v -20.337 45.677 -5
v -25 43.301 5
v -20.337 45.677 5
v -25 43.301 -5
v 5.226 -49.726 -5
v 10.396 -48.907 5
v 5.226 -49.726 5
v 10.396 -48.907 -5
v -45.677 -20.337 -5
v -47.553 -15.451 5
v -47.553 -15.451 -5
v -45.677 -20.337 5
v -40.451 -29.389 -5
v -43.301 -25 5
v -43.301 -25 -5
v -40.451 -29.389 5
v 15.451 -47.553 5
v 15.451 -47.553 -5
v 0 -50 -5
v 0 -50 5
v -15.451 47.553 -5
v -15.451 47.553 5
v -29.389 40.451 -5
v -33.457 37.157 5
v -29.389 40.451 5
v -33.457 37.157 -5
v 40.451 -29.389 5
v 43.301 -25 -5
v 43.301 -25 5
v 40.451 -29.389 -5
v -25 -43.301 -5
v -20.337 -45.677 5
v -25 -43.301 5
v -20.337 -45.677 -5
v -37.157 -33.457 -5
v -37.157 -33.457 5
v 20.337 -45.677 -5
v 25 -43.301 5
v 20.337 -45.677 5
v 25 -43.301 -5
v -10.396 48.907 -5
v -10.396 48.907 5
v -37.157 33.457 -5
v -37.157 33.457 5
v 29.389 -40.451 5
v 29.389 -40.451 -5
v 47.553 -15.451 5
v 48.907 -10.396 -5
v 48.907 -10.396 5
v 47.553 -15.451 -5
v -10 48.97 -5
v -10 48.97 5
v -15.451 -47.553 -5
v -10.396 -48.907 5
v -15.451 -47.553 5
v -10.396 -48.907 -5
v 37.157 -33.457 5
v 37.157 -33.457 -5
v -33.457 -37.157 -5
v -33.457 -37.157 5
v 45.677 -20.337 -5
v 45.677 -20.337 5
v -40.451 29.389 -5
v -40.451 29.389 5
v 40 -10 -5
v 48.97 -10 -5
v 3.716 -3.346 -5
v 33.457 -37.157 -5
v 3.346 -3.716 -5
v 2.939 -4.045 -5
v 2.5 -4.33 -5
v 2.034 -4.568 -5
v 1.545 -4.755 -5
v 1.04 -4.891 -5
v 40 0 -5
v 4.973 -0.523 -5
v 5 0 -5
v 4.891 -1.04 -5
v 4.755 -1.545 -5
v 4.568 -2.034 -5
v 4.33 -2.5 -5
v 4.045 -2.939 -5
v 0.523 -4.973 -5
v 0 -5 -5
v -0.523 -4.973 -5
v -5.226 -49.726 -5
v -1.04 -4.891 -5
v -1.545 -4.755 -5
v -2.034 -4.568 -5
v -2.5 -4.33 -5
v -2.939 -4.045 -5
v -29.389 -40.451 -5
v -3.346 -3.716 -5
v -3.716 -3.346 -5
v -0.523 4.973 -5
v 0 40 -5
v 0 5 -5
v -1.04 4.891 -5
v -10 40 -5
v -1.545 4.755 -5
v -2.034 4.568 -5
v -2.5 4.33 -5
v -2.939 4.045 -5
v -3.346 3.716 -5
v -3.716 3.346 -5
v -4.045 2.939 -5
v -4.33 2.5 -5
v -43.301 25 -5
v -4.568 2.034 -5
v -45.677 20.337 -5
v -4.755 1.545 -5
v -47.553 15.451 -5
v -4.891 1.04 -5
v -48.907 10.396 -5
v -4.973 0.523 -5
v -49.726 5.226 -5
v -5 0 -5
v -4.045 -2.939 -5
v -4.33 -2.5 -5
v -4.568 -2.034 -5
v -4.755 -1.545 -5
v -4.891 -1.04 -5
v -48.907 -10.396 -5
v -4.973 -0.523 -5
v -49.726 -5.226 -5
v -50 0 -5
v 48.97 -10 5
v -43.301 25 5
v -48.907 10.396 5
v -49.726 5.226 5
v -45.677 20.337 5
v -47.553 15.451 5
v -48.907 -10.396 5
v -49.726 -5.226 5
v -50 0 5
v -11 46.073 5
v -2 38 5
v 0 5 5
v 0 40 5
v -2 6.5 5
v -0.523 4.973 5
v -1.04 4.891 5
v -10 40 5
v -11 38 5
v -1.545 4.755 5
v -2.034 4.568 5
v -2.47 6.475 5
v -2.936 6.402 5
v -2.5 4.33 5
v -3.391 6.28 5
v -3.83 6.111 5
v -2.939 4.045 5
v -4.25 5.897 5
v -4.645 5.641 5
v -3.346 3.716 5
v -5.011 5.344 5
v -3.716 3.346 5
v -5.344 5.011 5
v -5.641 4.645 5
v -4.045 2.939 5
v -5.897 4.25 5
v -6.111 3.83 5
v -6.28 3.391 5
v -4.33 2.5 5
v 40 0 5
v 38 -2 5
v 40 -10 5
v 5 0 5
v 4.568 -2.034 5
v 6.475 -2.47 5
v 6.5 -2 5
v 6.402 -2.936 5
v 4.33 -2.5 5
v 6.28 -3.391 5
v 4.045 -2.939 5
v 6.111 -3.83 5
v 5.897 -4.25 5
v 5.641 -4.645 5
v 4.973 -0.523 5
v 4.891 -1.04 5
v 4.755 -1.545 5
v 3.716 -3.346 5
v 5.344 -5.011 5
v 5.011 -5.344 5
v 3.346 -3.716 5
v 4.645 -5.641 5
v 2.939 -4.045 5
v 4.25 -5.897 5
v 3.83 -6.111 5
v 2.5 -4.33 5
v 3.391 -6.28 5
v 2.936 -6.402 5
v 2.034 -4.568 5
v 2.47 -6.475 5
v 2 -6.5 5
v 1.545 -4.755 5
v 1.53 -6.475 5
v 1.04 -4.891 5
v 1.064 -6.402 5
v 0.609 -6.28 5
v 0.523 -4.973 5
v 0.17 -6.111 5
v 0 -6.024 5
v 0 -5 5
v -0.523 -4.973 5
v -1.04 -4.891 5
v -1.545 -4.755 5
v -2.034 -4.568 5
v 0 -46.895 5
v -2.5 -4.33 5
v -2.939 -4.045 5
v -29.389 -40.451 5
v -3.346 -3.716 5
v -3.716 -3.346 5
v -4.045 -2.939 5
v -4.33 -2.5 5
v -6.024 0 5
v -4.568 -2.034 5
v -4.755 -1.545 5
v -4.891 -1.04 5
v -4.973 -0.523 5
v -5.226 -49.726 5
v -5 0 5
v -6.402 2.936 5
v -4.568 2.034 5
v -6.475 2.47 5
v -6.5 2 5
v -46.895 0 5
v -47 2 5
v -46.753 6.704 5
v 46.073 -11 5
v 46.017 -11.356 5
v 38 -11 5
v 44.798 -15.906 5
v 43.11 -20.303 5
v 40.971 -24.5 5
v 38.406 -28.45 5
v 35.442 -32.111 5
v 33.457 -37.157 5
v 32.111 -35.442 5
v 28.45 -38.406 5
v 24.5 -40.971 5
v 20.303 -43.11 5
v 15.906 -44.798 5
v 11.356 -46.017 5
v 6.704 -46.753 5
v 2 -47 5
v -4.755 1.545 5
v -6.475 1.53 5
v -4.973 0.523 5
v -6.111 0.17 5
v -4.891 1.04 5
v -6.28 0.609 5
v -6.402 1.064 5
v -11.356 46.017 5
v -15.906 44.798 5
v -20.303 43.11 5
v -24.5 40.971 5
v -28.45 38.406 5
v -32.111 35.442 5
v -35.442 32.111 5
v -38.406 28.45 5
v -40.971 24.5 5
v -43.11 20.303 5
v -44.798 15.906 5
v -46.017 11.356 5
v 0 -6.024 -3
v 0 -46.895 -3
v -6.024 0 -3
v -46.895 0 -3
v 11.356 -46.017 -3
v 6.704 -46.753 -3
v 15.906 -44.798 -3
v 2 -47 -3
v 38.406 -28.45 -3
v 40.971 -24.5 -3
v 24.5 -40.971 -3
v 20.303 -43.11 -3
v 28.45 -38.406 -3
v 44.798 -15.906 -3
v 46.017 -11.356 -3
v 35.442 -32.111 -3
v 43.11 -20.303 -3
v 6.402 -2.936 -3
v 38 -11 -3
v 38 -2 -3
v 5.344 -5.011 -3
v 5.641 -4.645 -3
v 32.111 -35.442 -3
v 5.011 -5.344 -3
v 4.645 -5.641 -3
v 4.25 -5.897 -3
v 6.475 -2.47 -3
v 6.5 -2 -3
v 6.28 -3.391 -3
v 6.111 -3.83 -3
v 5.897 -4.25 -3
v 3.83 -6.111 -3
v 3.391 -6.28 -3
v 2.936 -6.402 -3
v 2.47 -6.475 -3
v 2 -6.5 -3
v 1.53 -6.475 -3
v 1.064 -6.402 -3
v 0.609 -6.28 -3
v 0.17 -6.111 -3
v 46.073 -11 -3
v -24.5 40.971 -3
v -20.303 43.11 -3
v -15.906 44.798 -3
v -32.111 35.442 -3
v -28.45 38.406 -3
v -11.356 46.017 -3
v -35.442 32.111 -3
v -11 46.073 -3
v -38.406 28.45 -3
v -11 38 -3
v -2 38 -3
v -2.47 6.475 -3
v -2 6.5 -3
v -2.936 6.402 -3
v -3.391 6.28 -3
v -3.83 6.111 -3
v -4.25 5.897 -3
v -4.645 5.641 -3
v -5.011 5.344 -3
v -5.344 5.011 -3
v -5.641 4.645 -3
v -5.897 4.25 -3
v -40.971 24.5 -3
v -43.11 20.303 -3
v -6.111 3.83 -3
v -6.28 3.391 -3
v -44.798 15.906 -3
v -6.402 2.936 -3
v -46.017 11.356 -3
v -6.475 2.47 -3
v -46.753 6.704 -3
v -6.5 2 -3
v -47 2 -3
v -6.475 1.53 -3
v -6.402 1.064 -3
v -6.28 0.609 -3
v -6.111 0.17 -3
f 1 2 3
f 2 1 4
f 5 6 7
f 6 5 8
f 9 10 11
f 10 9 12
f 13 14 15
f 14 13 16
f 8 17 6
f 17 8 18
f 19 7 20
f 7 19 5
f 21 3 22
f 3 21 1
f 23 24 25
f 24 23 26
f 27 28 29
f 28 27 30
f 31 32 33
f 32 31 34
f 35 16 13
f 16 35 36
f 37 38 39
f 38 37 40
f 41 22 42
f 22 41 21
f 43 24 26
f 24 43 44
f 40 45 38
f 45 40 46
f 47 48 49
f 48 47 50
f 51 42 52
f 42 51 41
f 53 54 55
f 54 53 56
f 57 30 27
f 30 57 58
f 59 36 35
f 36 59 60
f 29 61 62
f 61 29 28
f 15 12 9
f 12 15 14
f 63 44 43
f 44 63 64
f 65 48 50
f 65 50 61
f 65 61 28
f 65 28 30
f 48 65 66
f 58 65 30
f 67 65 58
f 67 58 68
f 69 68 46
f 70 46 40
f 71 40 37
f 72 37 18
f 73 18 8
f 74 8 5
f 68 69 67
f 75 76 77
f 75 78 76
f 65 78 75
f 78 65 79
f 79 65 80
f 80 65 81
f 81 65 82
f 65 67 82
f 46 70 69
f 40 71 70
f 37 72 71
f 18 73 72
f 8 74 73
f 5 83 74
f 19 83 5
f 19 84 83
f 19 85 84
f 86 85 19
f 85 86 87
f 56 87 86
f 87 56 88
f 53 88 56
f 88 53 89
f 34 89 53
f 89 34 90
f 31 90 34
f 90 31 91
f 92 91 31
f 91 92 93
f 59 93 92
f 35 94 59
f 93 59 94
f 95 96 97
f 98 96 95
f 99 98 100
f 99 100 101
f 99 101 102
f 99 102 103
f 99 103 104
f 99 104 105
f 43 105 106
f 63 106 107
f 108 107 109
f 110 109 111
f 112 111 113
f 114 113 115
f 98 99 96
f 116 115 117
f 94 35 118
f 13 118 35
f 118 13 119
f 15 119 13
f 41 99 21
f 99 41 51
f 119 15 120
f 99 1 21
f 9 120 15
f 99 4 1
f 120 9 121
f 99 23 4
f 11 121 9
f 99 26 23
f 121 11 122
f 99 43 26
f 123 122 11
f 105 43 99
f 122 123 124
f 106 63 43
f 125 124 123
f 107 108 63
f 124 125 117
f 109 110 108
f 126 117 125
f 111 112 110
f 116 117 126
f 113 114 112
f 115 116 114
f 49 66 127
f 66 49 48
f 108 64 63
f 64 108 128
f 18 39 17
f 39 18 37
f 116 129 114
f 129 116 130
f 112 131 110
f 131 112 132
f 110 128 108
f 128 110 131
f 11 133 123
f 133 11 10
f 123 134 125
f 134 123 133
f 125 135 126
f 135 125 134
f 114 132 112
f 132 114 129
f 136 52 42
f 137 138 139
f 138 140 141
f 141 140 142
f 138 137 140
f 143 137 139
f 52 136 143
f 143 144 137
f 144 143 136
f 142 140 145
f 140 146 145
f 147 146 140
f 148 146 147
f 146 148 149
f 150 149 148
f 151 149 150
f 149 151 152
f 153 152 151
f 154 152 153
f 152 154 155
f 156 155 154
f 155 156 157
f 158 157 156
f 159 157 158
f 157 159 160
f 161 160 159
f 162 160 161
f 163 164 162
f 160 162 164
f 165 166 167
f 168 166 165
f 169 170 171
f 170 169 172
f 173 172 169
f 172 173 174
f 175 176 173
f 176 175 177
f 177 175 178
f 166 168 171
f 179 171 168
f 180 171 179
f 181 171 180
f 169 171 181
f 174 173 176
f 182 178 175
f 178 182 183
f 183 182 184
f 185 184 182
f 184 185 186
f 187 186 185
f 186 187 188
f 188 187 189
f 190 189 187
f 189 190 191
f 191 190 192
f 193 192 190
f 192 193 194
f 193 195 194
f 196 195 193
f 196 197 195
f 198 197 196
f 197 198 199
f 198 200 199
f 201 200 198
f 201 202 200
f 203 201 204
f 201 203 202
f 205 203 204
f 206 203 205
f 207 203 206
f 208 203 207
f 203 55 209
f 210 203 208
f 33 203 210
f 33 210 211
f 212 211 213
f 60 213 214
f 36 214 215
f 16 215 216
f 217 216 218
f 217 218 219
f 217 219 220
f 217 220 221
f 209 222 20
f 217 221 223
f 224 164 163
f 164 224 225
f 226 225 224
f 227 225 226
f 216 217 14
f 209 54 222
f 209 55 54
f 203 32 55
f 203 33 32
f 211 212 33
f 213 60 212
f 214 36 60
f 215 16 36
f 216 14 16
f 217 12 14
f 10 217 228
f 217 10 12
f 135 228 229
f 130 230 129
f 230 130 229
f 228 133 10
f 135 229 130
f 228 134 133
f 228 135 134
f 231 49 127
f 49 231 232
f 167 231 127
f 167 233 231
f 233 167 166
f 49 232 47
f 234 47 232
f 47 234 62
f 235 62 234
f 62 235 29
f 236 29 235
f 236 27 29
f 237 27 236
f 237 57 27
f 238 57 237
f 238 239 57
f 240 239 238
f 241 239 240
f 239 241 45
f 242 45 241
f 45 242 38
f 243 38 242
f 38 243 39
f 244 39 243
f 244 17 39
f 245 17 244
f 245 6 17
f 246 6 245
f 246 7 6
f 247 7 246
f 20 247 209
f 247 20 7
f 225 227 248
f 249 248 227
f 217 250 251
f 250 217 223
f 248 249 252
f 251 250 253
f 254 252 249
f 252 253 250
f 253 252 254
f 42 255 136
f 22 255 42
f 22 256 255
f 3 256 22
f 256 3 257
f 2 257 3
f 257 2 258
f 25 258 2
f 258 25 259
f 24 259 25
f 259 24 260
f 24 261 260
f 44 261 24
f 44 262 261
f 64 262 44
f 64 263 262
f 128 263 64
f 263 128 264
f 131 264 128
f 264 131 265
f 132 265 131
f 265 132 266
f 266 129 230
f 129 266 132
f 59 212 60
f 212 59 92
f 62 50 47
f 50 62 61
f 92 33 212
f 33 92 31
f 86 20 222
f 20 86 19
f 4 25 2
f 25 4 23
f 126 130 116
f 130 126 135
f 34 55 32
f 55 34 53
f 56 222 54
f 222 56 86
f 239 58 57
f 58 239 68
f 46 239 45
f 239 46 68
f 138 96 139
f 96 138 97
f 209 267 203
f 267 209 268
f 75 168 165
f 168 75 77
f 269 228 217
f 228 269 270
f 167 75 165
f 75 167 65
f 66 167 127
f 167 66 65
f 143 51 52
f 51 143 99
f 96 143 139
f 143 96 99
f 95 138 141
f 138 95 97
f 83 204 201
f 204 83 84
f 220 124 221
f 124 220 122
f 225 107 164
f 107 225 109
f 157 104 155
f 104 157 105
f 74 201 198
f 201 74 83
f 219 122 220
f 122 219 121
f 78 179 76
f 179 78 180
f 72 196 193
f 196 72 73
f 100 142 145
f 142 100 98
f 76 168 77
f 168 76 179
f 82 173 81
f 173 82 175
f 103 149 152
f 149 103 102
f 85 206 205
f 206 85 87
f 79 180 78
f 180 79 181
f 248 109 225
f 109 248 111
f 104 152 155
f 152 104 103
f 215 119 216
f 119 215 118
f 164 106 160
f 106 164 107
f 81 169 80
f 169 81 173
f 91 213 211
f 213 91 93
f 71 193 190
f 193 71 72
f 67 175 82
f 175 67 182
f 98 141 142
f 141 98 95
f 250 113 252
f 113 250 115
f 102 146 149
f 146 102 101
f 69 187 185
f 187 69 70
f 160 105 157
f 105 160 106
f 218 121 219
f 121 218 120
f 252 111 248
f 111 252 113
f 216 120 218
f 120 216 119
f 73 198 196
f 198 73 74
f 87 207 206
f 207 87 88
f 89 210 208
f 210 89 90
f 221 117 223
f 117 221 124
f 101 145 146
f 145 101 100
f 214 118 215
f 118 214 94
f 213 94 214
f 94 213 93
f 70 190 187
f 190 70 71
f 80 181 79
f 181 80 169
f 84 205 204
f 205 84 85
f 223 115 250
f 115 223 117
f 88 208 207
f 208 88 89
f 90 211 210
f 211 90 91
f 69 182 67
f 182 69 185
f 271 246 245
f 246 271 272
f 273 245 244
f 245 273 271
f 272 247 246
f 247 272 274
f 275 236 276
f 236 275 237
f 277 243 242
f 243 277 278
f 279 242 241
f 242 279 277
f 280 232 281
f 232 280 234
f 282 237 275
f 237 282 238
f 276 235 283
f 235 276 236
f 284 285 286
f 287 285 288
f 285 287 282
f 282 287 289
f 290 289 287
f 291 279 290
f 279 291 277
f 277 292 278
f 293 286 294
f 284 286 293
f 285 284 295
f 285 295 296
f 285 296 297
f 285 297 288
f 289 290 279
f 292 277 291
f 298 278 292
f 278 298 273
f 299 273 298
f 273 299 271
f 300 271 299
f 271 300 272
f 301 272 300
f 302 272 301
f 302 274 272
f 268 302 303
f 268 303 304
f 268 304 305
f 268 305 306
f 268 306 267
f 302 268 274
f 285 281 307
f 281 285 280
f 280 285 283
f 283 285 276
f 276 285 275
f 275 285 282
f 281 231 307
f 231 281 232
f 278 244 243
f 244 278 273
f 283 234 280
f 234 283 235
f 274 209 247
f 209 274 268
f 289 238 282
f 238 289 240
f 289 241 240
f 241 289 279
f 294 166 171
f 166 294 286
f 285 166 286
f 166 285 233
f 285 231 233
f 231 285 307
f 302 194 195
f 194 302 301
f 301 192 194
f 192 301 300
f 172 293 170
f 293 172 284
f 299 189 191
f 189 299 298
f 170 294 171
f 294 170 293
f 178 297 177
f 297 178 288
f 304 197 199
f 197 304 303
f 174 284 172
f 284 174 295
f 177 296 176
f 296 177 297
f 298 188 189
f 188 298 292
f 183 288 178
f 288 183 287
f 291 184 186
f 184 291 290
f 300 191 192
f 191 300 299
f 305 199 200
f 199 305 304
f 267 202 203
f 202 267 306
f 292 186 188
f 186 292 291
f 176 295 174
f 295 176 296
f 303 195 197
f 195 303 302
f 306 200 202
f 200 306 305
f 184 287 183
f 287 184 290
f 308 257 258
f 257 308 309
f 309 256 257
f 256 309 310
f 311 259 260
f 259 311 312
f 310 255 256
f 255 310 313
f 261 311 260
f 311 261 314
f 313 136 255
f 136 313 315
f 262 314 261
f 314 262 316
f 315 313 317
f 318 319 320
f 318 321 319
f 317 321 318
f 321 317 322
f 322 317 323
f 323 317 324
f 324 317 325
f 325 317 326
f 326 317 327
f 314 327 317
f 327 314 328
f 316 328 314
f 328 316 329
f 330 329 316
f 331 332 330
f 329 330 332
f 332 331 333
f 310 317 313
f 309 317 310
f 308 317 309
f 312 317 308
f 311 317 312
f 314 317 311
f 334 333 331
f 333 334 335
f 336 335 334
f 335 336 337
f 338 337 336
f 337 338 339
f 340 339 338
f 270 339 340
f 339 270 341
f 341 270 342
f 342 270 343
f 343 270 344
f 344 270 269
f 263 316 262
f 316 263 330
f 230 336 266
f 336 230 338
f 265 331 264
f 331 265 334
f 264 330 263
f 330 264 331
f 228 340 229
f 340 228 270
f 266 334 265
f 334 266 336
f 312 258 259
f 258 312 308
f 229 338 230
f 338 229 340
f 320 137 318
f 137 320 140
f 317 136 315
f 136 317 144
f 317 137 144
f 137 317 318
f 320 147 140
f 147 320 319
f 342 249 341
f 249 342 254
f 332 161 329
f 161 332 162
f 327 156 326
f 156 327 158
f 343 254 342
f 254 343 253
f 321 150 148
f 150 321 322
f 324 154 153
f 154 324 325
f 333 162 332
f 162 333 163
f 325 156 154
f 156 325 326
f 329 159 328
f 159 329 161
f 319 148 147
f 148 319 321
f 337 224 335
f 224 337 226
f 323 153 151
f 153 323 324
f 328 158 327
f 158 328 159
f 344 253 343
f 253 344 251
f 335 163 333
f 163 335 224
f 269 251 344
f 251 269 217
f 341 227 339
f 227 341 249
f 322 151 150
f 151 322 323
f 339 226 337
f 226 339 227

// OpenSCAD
$fn = 60;

//cylinder(h=5,d=160,center=true);

difference(){
	color("Green") Support();
	difference(){
		translate([2, -2, 2]) scale([.9, .9, 1]) Support();
	  translate([-25, 0, 2]) cube([50,100,20], center=true);
	}
	difference(){
		translate([-2, 2, 2]) scale([.9, .9, 1]) Support();
	  translate([0, -25, 2]) cube([100,50,20], center=true);
	}
//	difference(){
//		Support();
//	  translate([-50, -50 ,1]) cube([50,50,20], center=true);
//	}
}


//cube([1650,2,10],center=ture);

module Support(){
	difference(){
		cylinder(h=10,d=100,center=true);
		translate([0,0,-10]) cube([50,50,20]);
		translate([40,-10,-10]) cube([10,11,20]);
		translate([-10,40,-10]) cube([11,10,20]);
		cylinder(h=12,d=10,center=true);
	}
}
